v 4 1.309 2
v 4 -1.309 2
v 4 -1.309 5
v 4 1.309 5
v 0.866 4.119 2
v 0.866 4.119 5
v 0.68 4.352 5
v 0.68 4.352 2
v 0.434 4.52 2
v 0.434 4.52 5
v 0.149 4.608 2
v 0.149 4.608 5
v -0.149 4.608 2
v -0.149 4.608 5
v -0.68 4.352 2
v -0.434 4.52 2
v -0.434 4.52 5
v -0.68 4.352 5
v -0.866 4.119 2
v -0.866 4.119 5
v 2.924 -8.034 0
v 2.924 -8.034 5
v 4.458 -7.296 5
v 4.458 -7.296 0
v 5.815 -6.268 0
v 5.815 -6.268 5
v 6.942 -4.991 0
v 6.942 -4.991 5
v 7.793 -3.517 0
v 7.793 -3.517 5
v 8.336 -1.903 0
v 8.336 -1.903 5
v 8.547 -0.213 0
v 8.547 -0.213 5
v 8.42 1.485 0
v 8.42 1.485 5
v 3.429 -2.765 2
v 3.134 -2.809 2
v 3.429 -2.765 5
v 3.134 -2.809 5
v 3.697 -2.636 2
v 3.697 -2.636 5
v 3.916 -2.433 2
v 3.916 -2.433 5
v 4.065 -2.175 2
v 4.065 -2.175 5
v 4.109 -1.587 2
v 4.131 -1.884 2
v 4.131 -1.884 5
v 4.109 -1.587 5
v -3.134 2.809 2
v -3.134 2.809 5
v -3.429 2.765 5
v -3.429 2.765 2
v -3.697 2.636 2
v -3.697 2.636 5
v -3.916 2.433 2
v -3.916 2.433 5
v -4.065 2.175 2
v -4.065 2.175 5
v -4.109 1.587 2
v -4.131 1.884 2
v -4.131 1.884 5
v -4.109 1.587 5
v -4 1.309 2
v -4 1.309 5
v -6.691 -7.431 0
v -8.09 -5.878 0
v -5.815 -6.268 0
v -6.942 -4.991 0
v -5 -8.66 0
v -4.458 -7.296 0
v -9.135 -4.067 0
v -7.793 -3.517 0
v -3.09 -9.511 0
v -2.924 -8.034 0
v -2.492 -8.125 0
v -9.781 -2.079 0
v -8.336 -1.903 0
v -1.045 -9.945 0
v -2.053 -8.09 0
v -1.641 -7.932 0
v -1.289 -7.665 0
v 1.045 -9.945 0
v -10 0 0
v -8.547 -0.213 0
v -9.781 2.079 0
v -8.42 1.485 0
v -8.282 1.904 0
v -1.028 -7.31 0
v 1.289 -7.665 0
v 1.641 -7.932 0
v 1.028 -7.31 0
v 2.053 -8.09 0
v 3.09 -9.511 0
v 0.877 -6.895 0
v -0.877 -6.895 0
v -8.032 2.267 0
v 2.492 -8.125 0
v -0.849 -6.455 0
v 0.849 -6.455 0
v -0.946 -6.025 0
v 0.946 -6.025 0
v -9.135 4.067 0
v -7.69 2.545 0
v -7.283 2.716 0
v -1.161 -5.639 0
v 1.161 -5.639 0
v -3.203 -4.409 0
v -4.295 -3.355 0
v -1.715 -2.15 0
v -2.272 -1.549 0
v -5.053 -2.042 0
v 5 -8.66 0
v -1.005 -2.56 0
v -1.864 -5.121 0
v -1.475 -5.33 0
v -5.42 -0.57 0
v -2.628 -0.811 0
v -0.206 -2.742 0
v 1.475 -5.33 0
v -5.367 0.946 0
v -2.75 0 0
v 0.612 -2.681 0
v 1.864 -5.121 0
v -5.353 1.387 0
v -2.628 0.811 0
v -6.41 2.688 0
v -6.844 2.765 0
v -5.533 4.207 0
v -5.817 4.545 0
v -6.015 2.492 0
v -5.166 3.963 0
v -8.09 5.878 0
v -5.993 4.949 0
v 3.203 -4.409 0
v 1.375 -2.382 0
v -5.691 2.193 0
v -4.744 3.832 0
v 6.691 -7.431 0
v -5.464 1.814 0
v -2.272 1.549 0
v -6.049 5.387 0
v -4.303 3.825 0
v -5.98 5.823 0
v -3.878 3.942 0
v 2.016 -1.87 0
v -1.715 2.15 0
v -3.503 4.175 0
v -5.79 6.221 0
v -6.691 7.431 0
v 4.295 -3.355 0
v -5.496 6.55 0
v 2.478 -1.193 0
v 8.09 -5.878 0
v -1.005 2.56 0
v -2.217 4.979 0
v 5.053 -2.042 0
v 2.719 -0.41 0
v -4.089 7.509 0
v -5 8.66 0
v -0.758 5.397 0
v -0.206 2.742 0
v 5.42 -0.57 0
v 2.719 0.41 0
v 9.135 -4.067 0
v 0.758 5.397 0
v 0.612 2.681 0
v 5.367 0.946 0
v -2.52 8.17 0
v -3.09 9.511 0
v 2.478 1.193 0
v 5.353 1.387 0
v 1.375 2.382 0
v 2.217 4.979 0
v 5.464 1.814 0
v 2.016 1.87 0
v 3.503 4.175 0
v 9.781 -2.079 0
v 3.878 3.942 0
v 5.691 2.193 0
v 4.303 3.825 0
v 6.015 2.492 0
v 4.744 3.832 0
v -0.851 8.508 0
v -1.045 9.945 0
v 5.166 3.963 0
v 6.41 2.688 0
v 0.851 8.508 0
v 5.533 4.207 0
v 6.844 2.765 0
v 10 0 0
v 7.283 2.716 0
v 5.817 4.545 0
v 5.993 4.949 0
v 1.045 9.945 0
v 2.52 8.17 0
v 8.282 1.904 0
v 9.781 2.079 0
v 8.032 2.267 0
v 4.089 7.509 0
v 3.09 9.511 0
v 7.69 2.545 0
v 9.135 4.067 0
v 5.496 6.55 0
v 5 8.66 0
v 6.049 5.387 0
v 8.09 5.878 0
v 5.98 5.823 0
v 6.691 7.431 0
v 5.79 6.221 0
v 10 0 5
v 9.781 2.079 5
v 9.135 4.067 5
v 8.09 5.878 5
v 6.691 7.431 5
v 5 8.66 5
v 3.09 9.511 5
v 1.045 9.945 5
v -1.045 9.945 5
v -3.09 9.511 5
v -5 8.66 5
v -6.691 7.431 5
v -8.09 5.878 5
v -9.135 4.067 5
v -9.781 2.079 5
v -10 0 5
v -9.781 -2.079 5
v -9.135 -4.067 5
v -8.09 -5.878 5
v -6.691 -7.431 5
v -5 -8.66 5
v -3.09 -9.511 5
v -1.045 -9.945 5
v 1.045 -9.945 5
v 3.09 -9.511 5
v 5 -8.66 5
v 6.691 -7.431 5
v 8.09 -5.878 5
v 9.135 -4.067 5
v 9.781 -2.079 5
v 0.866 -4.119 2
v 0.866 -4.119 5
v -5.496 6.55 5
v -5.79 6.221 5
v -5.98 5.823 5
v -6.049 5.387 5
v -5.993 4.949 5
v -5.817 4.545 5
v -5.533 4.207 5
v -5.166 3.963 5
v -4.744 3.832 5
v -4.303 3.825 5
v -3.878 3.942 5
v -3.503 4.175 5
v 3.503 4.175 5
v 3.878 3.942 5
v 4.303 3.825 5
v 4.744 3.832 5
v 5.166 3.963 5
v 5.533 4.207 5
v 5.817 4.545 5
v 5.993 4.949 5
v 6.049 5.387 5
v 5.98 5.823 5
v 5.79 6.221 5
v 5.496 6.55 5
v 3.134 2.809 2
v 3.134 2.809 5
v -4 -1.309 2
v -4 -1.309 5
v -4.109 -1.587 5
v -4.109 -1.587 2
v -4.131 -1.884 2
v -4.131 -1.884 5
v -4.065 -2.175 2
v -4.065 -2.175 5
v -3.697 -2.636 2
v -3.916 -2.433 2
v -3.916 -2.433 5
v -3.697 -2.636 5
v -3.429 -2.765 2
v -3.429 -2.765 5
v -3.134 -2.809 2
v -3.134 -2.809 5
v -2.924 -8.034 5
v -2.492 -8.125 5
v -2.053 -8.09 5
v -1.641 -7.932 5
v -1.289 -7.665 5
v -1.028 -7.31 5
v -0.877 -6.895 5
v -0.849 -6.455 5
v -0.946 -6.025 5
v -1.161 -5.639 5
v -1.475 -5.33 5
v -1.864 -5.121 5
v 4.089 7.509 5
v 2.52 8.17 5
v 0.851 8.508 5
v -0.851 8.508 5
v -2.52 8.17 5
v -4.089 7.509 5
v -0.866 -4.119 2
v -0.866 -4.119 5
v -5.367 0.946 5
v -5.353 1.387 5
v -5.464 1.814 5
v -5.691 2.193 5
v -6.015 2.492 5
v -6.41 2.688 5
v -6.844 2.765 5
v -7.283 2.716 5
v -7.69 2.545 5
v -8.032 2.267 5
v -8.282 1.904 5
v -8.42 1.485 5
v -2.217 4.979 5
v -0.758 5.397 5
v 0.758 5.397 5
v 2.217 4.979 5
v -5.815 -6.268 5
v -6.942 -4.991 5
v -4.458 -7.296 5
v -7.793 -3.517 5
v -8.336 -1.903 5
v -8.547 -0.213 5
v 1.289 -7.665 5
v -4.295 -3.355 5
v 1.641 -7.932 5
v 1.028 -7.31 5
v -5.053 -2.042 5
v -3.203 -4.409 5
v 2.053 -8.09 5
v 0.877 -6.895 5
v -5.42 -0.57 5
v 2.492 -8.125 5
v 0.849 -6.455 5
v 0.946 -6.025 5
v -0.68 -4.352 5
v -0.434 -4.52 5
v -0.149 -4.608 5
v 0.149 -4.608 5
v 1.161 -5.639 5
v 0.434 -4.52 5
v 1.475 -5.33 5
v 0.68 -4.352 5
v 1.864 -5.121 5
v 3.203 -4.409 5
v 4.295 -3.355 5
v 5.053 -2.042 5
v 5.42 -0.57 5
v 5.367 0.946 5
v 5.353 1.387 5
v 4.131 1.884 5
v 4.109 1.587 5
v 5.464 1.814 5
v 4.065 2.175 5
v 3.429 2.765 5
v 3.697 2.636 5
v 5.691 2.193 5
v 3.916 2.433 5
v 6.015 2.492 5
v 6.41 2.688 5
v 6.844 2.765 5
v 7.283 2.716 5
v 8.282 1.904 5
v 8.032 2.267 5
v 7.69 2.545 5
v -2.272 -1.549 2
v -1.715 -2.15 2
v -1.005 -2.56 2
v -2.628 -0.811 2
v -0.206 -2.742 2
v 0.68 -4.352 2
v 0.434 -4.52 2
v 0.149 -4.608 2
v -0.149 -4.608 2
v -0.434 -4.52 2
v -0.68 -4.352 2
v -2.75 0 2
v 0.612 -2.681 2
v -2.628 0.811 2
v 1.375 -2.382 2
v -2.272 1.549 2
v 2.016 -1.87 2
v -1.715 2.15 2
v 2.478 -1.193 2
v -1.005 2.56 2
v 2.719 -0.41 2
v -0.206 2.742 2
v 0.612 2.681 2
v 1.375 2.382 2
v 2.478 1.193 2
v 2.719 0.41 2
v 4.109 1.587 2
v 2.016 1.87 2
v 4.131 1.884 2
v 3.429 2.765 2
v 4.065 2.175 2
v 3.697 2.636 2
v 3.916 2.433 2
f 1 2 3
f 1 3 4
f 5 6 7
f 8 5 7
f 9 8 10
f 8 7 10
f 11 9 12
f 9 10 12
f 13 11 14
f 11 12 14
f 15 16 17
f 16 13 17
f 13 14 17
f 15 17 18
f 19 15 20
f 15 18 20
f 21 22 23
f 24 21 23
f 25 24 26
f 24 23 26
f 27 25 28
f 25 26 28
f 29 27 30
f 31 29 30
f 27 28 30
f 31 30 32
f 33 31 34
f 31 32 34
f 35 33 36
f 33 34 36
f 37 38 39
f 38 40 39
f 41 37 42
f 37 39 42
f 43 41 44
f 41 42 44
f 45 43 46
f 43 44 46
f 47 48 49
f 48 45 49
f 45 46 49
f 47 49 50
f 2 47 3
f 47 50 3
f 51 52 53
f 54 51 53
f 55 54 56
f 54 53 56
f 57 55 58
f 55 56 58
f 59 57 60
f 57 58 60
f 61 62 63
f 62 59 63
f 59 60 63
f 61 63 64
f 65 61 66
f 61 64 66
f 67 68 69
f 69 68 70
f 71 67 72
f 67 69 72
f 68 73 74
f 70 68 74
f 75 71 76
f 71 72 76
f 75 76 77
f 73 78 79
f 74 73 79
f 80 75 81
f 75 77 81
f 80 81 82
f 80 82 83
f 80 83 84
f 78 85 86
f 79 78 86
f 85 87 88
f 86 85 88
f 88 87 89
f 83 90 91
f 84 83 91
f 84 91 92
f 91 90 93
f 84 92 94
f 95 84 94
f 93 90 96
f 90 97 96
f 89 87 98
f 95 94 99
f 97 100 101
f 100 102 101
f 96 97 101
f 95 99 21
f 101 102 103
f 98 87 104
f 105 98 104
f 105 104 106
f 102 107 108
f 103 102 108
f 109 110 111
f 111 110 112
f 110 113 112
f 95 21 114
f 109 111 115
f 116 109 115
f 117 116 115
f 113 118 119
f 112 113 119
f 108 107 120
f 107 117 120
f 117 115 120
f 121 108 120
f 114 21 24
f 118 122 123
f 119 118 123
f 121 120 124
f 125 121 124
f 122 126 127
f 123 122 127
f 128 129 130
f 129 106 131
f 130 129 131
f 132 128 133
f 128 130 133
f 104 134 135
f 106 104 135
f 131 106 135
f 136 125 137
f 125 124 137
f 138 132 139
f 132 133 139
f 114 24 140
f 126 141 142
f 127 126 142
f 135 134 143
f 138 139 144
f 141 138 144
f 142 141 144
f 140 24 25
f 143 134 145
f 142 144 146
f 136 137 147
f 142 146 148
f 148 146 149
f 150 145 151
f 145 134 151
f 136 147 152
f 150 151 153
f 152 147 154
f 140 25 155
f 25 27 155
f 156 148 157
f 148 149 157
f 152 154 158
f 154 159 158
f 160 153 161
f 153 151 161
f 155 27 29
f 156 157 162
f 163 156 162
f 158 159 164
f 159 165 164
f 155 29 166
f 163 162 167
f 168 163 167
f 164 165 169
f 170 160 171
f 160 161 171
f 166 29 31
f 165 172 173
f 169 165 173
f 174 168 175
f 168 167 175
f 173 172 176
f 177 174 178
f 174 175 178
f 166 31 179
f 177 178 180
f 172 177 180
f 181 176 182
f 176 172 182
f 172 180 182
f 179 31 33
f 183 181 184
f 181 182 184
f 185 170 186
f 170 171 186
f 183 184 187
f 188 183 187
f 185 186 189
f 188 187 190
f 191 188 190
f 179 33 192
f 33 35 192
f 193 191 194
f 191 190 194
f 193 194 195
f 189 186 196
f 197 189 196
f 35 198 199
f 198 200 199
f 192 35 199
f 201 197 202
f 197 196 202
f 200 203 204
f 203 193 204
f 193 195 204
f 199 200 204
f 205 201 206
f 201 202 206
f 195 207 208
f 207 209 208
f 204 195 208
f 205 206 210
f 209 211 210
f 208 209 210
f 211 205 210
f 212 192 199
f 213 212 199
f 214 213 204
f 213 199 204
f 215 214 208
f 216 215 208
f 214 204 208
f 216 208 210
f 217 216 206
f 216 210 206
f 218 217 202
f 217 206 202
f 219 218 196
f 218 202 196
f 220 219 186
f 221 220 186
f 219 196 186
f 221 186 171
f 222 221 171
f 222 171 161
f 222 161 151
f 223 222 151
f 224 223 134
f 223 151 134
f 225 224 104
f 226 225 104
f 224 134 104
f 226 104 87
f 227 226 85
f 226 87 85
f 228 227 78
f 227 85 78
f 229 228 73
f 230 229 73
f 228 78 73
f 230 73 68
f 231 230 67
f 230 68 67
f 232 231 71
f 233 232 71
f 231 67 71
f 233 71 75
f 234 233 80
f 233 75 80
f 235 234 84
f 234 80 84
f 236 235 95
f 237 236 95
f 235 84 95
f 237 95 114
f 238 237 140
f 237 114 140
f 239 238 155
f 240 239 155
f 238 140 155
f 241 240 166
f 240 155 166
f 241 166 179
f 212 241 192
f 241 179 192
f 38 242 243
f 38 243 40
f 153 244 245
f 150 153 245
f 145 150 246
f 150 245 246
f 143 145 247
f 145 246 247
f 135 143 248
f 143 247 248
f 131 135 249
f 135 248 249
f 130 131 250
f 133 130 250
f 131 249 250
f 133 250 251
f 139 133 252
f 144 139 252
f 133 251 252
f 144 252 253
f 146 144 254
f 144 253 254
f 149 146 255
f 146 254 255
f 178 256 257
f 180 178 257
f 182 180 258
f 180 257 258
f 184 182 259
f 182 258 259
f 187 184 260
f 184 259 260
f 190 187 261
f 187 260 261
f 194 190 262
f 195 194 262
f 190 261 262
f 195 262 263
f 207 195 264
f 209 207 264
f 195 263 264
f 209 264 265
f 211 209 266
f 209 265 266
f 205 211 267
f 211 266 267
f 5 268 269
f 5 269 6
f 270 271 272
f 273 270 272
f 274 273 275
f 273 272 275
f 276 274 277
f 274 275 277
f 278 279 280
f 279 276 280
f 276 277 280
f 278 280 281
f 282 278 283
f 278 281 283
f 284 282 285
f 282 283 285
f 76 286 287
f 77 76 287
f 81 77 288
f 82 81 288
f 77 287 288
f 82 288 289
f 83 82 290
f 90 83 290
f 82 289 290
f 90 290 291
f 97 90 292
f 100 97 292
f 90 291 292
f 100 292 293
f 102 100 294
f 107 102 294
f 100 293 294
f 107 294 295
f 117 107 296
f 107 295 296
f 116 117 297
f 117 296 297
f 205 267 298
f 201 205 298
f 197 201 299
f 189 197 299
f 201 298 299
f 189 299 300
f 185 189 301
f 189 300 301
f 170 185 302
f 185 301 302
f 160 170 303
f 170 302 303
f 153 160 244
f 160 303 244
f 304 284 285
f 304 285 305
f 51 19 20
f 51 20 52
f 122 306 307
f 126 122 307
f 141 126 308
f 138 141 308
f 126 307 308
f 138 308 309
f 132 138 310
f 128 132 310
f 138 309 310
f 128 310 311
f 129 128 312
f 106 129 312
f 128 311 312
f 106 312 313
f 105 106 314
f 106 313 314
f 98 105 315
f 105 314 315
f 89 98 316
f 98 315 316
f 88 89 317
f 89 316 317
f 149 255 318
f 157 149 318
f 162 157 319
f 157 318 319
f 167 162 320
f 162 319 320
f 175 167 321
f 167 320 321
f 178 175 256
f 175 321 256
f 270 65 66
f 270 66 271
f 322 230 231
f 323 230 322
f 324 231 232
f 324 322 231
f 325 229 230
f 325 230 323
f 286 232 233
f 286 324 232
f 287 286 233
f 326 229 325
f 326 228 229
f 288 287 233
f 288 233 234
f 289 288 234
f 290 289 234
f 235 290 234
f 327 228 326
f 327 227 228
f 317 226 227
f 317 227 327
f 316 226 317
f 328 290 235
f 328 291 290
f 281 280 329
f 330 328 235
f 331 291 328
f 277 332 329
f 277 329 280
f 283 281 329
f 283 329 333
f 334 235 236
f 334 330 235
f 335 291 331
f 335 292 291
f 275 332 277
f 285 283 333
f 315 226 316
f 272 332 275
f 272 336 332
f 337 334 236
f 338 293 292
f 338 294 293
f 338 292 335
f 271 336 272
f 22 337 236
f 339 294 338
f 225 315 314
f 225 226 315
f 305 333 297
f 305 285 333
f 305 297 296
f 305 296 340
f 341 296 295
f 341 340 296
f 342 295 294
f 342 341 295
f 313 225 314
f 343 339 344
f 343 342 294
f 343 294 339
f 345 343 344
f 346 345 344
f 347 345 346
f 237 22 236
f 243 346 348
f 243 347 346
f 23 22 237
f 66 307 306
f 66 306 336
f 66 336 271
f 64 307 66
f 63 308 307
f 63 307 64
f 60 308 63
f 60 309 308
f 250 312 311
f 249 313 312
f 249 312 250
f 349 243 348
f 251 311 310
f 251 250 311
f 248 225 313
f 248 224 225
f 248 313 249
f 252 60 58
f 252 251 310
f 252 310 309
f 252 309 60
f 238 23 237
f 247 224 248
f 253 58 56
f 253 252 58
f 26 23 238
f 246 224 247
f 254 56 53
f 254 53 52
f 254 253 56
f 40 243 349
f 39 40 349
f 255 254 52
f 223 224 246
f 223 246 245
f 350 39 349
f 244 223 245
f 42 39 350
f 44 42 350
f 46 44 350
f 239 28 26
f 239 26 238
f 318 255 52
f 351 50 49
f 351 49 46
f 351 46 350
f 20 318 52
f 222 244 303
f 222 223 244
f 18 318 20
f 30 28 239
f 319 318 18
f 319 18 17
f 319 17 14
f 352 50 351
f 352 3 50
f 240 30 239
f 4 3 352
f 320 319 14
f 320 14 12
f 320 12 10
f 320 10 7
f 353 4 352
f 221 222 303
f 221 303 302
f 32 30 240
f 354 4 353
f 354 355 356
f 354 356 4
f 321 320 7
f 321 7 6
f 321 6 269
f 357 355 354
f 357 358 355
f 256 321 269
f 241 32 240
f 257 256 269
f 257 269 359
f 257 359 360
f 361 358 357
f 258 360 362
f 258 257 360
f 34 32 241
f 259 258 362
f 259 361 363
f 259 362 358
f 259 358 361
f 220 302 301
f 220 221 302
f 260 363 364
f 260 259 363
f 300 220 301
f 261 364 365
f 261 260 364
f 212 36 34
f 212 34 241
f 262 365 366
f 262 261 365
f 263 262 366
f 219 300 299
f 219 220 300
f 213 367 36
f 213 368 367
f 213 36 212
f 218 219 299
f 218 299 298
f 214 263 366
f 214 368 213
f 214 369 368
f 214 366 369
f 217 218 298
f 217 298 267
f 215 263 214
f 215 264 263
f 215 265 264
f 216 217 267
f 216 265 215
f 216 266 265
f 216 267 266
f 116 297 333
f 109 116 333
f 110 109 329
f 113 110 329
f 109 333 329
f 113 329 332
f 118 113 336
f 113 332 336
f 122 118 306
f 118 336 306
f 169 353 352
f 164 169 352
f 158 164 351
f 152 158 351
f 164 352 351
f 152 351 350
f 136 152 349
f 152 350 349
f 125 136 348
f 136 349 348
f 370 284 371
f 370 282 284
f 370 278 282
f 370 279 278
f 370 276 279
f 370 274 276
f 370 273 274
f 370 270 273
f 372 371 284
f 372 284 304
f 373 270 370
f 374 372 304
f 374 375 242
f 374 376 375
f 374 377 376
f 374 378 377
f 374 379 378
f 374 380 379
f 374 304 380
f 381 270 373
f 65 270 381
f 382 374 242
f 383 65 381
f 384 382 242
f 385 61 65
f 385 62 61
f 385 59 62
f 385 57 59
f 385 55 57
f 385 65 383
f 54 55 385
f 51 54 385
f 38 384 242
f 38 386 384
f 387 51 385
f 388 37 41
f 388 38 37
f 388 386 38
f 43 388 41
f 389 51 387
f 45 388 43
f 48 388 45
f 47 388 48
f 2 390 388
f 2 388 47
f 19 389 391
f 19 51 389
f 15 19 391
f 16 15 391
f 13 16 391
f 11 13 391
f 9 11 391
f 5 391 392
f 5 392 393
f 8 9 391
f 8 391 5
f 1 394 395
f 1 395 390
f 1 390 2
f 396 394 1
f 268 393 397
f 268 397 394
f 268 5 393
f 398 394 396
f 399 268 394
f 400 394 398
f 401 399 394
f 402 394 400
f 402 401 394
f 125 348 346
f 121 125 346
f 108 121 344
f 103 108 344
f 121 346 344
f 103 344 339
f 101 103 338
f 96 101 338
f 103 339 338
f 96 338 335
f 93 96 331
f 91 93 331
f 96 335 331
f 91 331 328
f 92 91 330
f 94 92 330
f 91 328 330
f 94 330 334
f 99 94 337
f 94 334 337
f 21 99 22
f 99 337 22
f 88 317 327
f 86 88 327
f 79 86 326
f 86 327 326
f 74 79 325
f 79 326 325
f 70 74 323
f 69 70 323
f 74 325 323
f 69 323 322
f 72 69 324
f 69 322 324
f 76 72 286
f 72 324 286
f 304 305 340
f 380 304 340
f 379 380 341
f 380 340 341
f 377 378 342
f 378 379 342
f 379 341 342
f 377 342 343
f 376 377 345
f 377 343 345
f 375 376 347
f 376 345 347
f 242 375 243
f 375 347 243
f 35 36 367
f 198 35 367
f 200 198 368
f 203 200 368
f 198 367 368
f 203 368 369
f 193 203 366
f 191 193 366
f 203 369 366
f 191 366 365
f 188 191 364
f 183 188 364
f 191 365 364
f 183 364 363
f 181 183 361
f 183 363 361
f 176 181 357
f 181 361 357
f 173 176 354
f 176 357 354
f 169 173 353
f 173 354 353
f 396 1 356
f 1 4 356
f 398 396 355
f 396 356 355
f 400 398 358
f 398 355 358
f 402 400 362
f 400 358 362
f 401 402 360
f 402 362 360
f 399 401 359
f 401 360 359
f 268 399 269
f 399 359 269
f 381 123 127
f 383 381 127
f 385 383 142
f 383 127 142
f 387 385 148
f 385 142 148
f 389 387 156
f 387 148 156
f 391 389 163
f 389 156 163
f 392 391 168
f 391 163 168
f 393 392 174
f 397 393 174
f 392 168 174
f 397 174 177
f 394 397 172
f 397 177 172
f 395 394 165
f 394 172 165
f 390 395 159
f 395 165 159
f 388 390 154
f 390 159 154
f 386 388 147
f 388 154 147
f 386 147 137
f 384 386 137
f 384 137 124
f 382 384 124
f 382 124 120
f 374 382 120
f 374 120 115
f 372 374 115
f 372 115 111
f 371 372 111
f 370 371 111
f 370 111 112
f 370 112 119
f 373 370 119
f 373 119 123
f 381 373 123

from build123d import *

# Parameters (mm, degrees)
SKETCH_1_R          = 10
EXTRUDE_1_DEPTH     = 5
CUT_EXTRUDE_1_DEPTH = 3
SKETCH_4_R          = 1
CUT_EXTRUDE_3_DEPTH = 3
CUT_EXTRUDE_2_DEPTH = 5
SKETCH_5_R          = 2.75
CUT_EXTRUDE_4_DEPTH = 10


with BuildPart() as part:
    # 스케치1 → 보스-돌출1 (new body)
    with BuildSketch(Plane.XY):
        Circle(SKETCH_1_R)
    extrude(amount=EXTRUDE_1_DEPTH)

    # 스케치2 → 컷-돌출1 (cut)
    with BuildSketch(Plane.XY.offset(5)):
        Polygon((0, 4.618802154), (-4, 2.309401077), (-4, -2.309401077), (0, -4.618802154), (4, -2.309401077), (4, 2.309401077), align=None)
    extrude(amount=-CUT_EXTRUDE_1_DEPTH, mode=Mode.SUBTRACT)

    # 스케치4 → 컷-돌출3 (cut)
    with BuildSketch(Plane.XY.offset(5)):
        with Locations((0, 3.618802154)):
            Circle(SKETCH_4_R)
        with Locations((3.133974596, 1.809401077)):
            Circle(SKETCH_4_R)
        with Locations((3.133974596, -1.809401077)):
            Circle(SKETCH_4_R)
        with Locations((0, -3.618802154)):
            Circle(SKETCH_4_R)
        with Locations((-3.133974596, -1.809401077)):
            Circle(SKETCH_4_R)
        with Locations((-3.133974596, 1.809401077)):
            Circle(SKETCH_4_R)
    extrude(amount=-CUT_EXTRUDE_3_DEPTH, mode=Mode.SUBTRACT)

    # 스케치3 → 컷-돌출2 (cut)
    with BuildSketch(Plane.XY.offset(5)):
        with BuildLine():
            ThreePointArc((5.495834063, 6.549679989), (0, 8.55), (-5.495834063, 6.549679989))
            ThreePointArc((-5.495834063, 6.549679989), (-5.686882155, 4.365990307), (-3.503192473, 4.174942215))
            ThreePointArc((-3.503192473, 4.174942215), (0, 5.45), (3.503192473, 4.174942215))
            ThreePointArc((3.503192473, 4.174942215), (5.686882155, 4.365990307), (5.495834063, 6.549679989))
        make_face()
        with BuildLine():
            ThreePointArc((2.924272225, -8.034371908), (7.404517202, -4.275), (8.420106288, 1.484691919))
            ThreePointArc((8.420106288, 1.484691919), (6.624499596, 2.741989261), (5.367202254, 0.946382568))
            ThreePointArc((5.367202254, 0.946382568), (4.719838451, -2.725), (1.864009781, -5.121324783))
            ThreePointArc((1.864009781, -5.121324783), (0.937617441, -7.107979568), (2.924272225, -8.034371908))
        make_face()
        with BuildLine():
            ThreePointArc((-8.420106288, 1.484691919), (-7.404517202, -4.275), (-2.924272225, -8.034371908))
            ThreePointArc((-2.924272225, -8.034371908), (-0.937617441, -7.107979568), (-1.864009781, -5.121324783))
            ThreePointArc((-1.864009781, -5.121324783), (-4.719838451, -2.725), (-5.367202254, 0.946382568))
            ThreePointArc((-5.367202254, 0.946382568), (-6.624499596, 2.741989261), (-8.420106288, 1.484691919))
        make_face()
    extrude(amount=-CUT_EXTRUDE_2_DEPTH, mode=Mode.SUBTRACT)

    # 스케치5 → 컷-돌출4 (cut)
    with BuildSketch(Plane(origin=(0, 0, 0), x_dir=(-1, 0, 0), z_dir=(0, 0, -1))):
        Circle(SKETCH_5_R)
    extrude(amount=-CUT_EXTRUDE_4_DEPTH, mode=Mode.SUBTRACT)


solid = part.part
